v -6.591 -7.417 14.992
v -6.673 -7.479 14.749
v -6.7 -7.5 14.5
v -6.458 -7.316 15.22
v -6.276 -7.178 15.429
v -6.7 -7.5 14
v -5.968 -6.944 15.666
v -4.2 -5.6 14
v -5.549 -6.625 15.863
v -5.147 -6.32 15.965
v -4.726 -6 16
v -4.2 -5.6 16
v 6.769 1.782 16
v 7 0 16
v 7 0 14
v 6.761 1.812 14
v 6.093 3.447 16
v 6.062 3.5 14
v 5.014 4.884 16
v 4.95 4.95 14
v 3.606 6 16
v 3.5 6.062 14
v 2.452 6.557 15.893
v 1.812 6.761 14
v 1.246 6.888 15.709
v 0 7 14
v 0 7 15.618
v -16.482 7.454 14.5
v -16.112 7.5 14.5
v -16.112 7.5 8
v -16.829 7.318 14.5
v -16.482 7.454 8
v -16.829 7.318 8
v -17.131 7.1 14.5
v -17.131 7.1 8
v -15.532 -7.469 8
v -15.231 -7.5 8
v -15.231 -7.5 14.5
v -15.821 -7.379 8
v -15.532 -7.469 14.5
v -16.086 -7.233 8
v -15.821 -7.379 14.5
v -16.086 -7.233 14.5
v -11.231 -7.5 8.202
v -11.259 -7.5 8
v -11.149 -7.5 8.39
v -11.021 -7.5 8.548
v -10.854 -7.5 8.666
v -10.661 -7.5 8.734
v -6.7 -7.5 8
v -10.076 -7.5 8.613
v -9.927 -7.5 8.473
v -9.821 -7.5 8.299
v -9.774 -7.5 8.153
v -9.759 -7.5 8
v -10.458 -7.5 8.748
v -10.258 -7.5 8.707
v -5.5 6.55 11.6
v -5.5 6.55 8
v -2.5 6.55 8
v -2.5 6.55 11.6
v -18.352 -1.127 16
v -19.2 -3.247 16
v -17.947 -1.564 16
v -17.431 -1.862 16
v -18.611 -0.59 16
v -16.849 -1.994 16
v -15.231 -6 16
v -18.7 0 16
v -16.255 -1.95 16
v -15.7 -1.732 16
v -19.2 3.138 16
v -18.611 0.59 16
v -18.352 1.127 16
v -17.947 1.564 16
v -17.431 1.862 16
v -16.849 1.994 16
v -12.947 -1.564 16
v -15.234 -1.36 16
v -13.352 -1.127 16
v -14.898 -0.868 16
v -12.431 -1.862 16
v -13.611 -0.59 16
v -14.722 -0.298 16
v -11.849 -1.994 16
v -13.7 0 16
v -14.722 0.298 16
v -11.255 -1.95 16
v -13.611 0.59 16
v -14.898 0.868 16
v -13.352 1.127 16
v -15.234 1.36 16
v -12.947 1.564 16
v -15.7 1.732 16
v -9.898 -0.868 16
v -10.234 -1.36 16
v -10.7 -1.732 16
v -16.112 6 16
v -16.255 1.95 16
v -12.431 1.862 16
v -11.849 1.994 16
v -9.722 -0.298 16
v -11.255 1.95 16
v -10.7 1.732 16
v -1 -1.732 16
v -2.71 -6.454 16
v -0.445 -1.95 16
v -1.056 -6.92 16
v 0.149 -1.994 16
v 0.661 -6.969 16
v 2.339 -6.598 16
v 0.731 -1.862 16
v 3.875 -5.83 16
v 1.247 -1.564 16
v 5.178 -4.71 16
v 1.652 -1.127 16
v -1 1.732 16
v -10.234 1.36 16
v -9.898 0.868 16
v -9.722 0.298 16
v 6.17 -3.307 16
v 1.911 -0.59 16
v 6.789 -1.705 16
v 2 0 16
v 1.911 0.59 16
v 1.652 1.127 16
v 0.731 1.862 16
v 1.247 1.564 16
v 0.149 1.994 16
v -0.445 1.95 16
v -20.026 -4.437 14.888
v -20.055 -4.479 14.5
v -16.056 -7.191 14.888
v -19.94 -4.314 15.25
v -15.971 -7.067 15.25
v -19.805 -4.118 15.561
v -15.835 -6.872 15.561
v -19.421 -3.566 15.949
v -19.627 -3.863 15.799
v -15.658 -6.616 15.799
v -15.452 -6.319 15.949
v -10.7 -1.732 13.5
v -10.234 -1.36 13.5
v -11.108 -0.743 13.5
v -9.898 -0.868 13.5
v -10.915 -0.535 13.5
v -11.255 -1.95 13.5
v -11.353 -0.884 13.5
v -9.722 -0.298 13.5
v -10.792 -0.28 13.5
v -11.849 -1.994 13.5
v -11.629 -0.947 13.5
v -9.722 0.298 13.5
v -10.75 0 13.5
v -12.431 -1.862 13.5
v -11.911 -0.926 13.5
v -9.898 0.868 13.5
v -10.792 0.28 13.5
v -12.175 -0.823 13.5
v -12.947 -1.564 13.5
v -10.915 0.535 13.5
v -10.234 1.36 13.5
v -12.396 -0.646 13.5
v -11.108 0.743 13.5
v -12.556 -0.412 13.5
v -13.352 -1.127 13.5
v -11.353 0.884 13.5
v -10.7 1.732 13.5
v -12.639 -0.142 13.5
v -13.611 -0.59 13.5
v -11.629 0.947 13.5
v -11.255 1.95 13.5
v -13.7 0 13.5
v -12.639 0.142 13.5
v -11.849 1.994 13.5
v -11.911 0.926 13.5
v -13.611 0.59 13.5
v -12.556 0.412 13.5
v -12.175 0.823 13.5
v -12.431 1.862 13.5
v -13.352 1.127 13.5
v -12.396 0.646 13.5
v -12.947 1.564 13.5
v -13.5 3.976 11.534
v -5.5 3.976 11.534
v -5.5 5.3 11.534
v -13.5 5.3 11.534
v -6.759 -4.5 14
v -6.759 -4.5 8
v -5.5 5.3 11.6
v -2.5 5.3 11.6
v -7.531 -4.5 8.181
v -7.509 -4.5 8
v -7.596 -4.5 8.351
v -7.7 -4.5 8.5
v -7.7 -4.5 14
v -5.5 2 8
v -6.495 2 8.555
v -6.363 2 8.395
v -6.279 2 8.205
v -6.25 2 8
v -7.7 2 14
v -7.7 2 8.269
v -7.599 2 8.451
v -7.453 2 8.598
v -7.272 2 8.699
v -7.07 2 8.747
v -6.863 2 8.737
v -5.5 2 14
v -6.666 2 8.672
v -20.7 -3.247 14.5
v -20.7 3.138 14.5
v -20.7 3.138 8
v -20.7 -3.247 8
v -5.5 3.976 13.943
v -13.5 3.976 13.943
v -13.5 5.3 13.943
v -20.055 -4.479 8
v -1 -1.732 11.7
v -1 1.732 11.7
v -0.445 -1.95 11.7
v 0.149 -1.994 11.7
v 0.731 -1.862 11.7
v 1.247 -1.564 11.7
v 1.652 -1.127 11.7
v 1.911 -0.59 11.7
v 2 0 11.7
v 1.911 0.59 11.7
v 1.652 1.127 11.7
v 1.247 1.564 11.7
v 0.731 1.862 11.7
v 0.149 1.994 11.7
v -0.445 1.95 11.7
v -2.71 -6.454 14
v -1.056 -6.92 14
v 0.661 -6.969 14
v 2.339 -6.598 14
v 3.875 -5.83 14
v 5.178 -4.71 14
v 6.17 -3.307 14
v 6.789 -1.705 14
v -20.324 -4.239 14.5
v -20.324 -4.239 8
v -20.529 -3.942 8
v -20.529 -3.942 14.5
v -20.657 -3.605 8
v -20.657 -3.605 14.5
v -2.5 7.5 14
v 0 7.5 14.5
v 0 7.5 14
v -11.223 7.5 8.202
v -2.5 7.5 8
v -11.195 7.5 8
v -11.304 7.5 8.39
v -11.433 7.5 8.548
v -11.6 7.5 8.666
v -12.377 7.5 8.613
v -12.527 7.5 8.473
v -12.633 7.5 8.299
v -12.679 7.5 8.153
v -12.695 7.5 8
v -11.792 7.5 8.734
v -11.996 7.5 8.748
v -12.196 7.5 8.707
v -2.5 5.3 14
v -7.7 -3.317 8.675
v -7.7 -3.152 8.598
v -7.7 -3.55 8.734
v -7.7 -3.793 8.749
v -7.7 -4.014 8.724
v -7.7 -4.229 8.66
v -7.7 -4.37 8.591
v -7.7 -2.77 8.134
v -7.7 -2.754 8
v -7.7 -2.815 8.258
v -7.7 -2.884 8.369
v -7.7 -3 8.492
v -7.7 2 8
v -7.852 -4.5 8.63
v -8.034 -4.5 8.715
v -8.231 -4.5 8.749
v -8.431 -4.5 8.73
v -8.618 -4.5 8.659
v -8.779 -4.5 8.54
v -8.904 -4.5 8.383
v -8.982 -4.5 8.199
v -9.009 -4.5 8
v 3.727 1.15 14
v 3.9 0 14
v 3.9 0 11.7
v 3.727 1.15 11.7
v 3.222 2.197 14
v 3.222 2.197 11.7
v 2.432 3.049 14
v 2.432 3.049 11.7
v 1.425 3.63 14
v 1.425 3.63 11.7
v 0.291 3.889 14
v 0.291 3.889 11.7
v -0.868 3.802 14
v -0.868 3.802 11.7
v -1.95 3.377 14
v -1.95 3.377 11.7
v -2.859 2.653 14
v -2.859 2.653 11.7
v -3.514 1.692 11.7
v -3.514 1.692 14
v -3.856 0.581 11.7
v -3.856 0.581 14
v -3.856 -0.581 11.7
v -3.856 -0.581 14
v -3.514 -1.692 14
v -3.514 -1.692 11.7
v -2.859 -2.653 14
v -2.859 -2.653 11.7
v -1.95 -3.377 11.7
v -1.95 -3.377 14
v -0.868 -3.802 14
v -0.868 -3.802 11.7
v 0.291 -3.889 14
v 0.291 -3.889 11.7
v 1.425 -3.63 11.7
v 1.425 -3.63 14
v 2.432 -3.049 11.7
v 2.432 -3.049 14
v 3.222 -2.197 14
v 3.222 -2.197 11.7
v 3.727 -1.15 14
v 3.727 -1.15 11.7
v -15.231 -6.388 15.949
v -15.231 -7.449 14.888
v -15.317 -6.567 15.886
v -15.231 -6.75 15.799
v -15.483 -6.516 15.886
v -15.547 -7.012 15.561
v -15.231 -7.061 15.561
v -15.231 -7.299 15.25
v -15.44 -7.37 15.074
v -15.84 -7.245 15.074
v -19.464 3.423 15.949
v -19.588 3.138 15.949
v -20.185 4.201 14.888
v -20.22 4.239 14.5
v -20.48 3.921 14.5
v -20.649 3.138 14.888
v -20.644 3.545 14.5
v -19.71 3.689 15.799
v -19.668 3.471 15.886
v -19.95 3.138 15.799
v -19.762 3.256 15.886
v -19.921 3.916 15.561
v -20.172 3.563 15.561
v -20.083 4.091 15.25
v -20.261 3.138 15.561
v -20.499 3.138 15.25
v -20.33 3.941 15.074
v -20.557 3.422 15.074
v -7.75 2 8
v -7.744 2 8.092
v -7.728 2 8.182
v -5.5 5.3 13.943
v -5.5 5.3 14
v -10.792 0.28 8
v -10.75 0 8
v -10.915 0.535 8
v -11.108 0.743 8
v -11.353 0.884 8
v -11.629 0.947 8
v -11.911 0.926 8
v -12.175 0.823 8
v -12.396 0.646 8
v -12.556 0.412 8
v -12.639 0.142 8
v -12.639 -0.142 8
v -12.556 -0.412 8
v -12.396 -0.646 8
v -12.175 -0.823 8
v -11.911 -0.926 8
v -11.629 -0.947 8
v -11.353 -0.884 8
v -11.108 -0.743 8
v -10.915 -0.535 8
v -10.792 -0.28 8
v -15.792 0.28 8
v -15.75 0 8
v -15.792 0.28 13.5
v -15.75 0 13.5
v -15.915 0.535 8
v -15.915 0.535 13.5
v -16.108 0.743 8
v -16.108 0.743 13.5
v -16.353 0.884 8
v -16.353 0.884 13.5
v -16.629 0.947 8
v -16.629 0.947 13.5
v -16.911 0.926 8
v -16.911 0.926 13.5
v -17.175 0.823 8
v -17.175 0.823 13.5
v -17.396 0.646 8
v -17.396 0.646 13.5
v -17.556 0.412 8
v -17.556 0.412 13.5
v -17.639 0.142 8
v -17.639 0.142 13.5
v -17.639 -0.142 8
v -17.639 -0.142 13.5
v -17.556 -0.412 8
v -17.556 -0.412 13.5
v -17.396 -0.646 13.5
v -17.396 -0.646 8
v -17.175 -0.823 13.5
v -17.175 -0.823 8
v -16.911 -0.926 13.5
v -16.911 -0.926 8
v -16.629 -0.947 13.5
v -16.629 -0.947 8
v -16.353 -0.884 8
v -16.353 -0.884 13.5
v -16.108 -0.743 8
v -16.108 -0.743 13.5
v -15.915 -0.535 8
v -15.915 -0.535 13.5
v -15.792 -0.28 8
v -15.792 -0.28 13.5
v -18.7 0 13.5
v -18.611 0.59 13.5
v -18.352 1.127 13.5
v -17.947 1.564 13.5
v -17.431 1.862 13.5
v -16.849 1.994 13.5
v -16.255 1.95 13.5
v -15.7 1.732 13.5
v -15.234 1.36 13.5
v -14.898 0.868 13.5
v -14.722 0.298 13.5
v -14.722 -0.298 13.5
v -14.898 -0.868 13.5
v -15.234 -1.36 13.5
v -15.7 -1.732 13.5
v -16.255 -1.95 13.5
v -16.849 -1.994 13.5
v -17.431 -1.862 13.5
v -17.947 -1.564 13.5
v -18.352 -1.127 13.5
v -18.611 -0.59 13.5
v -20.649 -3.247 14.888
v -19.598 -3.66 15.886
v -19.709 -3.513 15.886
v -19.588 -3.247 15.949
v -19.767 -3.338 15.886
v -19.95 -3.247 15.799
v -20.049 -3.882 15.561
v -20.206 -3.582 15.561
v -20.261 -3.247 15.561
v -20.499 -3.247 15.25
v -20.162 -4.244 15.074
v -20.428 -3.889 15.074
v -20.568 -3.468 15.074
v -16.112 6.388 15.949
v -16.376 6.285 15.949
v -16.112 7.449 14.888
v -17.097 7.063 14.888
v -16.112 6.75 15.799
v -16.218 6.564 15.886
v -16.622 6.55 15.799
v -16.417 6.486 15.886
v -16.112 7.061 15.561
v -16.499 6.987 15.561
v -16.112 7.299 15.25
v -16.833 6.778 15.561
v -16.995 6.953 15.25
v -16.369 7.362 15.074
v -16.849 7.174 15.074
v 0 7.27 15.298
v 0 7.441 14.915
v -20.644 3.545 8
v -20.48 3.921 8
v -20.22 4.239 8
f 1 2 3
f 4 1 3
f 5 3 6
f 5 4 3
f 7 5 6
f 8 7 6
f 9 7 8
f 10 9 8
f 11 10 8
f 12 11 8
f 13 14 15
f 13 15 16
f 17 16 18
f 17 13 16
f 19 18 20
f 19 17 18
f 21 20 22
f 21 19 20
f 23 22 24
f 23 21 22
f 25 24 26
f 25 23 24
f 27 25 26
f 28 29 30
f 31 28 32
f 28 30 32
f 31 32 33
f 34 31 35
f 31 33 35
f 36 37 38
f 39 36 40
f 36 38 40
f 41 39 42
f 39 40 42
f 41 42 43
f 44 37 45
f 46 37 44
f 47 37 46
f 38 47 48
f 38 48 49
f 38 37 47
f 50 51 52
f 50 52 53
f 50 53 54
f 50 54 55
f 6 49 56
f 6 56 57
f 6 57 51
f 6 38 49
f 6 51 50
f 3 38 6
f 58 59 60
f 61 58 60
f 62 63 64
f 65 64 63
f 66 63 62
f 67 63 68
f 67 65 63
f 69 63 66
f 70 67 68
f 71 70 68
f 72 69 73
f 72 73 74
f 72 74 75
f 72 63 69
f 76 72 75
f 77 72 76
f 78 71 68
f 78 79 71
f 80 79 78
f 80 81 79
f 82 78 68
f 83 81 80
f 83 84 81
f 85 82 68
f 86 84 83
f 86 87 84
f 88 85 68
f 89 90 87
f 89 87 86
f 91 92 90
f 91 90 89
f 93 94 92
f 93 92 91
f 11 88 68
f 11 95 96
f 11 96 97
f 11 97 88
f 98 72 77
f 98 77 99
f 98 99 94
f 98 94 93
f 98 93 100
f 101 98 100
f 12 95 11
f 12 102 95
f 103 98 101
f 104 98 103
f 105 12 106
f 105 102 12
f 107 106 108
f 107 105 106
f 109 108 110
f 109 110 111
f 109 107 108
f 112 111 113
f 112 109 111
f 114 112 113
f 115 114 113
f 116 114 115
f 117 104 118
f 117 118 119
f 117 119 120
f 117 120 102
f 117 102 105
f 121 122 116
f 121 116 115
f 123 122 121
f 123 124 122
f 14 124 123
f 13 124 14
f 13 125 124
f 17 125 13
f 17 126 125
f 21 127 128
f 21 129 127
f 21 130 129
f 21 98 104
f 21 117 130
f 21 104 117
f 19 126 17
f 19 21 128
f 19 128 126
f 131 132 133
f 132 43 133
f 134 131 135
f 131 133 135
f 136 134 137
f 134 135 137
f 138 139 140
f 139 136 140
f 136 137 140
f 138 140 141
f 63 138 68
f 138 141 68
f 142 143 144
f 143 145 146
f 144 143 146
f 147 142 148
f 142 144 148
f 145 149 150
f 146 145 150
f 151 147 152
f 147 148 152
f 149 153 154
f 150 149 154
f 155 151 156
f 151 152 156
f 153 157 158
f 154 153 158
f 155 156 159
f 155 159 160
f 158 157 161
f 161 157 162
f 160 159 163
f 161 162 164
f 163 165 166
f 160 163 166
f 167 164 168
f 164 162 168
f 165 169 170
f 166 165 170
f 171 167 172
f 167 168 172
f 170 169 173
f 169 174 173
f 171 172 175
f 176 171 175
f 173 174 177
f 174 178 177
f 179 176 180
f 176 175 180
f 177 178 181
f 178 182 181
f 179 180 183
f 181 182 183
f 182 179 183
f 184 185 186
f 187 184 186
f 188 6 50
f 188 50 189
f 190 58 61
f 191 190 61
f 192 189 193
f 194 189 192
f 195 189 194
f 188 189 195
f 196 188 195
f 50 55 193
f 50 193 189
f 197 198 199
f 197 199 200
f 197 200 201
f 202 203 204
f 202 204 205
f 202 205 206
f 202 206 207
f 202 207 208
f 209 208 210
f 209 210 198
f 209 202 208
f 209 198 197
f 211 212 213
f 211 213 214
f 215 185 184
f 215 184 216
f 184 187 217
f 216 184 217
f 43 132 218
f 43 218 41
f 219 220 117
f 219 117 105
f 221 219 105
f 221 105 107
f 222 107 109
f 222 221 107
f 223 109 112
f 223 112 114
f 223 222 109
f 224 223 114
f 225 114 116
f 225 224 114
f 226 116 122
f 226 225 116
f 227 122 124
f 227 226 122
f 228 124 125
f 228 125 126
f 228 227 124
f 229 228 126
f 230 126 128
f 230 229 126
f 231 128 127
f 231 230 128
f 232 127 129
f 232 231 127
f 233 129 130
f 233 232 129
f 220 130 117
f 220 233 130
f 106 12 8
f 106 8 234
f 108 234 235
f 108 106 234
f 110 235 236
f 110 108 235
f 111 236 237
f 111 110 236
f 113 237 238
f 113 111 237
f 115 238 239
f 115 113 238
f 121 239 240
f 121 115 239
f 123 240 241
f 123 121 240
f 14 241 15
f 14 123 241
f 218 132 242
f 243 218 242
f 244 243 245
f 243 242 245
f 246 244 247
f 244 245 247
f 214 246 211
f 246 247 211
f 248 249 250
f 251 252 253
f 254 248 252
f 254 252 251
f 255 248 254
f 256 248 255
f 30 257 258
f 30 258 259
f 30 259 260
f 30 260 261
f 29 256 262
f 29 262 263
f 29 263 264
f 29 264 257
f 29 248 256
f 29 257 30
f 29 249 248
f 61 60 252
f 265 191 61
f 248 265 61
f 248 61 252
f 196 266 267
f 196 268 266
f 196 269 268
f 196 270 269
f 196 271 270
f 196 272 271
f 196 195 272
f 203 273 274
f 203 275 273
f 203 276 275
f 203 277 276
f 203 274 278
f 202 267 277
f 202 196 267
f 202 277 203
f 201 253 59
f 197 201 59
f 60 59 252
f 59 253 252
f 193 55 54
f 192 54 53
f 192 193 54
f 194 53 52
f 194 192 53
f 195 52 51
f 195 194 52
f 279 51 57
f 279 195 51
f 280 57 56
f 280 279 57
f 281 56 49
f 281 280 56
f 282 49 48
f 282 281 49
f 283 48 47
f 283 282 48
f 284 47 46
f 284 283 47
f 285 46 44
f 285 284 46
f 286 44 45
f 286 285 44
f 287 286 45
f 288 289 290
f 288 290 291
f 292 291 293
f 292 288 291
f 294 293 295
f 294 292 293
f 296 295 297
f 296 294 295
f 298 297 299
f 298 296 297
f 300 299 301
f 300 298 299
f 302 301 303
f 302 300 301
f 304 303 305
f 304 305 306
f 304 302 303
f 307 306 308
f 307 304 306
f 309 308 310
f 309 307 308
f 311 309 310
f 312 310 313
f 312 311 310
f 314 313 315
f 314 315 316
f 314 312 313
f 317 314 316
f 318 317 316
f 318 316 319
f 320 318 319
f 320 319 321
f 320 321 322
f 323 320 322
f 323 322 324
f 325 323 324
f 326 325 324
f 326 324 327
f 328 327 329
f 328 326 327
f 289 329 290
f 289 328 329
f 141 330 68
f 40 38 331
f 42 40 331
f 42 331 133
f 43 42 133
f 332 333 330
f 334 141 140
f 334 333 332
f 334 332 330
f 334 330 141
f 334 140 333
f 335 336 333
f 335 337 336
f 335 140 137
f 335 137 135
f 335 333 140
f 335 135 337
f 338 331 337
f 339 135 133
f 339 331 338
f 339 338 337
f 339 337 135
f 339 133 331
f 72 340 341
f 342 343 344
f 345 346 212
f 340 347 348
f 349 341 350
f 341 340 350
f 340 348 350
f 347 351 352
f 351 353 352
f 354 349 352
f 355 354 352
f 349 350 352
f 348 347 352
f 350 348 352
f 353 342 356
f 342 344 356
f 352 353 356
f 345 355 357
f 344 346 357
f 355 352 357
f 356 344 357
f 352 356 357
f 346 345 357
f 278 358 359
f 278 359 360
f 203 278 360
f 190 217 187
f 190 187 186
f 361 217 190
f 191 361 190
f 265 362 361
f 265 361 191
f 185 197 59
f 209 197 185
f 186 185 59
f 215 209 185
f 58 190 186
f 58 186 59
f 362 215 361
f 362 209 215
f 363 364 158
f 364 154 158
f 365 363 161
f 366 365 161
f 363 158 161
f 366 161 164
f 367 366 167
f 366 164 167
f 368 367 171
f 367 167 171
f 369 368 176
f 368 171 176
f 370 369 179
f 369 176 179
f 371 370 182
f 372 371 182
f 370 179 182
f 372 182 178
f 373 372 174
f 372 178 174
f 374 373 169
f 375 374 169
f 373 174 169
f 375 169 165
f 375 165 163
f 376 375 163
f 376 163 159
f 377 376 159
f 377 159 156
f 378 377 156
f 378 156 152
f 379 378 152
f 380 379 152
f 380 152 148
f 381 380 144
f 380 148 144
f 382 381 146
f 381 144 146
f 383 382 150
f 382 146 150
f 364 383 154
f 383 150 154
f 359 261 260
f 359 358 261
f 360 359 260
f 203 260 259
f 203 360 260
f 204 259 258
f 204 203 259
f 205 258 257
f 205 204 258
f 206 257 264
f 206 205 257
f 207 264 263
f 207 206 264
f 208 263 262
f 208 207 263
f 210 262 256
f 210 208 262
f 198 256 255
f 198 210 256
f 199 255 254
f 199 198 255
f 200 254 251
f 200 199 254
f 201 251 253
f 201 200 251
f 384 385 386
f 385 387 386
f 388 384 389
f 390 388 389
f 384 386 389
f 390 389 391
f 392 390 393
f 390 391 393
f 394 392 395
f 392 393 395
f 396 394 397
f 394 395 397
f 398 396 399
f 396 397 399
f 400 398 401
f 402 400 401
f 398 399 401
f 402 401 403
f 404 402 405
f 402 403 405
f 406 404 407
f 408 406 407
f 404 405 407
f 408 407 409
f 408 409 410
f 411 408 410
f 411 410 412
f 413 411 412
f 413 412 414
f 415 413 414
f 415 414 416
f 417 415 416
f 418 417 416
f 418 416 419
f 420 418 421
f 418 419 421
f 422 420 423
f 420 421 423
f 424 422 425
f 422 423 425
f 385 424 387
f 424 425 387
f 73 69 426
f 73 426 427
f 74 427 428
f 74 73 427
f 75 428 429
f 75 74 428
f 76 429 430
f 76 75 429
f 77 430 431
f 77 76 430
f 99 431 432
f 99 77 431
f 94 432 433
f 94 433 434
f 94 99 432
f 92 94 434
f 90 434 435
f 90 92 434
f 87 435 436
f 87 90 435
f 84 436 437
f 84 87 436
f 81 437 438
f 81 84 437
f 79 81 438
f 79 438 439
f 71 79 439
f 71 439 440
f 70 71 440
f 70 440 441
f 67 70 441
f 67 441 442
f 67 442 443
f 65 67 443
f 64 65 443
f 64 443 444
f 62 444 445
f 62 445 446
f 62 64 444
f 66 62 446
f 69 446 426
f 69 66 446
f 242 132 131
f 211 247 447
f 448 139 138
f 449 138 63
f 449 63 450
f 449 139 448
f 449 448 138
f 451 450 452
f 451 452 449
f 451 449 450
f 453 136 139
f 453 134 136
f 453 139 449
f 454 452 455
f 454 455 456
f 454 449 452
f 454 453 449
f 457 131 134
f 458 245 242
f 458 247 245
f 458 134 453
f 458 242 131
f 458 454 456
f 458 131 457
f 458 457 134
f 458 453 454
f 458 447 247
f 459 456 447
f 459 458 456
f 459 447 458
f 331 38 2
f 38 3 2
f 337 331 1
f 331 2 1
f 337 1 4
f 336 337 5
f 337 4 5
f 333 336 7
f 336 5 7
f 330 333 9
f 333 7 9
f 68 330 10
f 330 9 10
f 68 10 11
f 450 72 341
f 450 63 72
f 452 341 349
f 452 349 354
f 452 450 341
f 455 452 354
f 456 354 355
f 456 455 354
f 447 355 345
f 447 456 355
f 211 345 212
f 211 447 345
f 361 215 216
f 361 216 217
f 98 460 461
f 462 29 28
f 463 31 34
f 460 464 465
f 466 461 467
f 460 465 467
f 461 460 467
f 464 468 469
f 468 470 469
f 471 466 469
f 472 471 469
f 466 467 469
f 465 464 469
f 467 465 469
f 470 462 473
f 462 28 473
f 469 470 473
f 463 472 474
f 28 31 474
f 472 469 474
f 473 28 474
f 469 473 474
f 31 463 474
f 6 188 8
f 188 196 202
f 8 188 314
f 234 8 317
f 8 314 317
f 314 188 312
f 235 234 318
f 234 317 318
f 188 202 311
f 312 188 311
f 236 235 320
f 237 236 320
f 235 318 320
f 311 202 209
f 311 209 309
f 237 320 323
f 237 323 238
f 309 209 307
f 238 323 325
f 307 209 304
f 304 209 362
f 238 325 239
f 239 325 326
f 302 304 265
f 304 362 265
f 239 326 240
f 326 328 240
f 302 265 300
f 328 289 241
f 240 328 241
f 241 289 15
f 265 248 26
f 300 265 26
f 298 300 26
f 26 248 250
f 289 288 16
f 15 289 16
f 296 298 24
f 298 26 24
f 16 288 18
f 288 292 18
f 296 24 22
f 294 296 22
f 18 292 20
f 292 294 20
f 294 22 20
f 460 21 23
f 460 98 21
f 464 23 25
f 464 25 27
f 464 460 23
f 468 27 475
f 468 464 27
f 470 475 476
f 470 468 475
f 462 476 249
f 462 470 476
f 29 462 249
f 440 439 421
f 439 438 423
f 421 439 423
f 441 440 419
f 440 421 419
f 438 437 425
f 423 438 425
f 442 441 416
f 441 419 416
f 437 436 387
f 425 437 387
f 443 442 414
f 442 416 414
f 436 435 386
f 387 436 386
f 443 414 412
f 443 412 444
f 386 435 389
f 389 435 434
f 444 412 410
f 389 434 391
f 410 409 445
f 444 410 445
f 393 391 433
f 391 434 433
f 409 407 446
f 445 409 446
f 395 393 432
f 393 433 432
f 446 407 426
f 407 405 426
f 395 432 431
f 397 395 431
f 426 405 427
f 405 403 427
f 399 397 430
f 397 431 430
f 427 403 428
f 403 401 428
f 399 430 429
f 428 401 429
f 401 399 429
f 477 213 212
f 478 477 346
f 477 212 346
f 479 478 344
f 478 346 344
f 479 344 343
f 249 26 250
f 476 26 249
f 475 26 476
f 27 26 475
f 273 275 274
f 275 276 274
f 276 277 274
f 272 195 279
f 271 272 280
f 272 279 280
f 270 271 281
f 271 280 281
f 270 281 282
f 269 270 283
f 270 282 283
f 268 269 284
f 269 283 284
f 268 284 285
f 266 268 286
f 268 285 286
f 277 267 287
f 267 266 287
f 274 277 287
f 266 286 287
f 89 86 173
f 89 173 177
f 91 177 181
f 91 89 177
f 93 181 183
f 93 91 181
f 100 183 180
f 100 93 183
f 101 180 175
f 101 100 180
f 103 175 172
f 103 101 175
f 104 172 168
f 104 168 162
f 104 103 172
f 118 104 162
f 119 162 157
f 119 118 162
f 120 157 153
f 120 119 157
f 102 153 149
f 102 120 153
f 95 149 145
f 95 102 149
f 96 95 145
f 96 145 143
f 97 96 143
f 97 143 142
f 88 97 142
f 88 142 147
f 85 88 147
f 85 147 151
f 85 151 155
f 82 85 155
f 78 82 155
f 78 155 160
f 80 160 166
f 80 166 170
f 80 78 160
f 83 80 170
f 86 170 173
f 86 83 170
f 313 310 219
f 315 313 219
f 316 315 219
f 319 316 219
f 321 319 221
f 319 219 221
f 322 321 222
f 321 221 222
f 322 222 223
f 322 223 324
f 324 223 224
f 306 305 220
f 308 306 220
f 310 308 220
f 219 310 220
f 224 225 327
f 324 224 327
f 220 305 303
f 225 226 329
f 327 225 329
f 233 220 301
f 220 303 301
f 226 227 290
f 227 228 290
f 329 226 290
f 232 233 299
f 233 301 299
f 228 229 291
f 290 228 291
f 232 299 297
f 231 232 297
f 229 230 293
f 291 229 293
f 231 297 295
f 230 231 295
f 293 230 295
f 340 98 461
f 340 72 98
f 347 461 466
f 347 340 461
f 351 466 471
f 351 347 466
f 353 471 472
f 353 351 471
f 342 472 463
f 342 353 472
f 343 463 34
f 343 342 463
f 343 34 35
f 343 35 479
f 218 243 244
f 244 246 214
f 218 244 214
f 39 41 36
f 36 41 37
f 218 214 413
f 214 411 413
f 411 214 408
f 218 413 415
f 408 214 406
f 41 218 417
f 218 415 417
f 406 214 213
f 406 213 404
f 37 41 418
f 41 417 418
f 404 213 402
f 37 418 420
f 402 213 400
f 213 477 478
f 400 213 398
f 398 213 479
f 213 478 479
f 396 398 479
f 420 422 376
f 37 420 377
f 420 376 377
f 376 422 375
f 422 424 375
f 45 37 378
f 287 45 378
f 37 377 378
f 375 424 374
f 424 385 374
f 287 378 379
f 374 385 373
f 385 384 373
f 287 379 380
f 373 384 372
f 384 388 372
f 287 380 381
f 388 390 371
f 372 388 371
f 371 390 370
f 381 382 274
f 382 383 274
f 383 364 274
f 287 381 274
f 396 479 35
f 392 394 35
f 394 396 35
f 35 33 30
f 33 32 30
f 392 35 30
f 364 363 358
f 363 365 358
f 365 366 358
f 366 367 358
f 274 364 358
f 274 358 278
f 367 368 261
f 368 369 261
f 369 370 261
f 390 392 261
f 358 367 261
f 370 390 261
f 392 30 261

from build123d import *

# Parameters (mm, degrees)
BOSS_EXTRUDE1_DEPTH = 2
BOSS_EXTRUDE2_DEPTH = 6
SKETCH24_R          = 3.9
BOSS_EXTRUDE5_DEPTH = 2.3
SKETCH30_W          = 2.408612022
SKETCH30_H          = 1.324178481
CUT_EXTRUDE12_DEPTH = 8
CUT_EXTRUDE11_DEPTH = 5.3
FILLET1_R           = 1.5
SKETCH34_R          = 0.75
CUT_EXTRUDE13_DEPTH = 8
SKETCH35_R          = 0.75
CUT_EXTRUDE14_DEPTH = 4
SKETCH36_R          = 0.95
CUT_EXTRUDE15_DEPTH = 8
SKETCH37_R          = 2
CUT_EXTRUDE16_DEPTH = 2.5
SKETCH38_W          = 3
SKETCH38_H          = 1.25
CUT_EXTRUDE17_DEPTH = 3.6


with BuildPart() as part:
    # Sketch2 → Boss-Extrude1 (new body)
    with BuildSketch(Plane.XY):
        with BuildLine():
            Line((-2.5, 7.5), (-16.7, 7.5))
            Line((-16.7, 7.5), (-20.7, 3.793442666))
            Line((-20.7, 3.793442666), (-20.7, -4.031648778))
            Line((-20.7, -4.031648778), (-15.7, -7.5))
            Line((-15.7, -7.5), (-6.7, -7.5))
            Line((-6.7, -7.5), (-4.2, -5.6))
            ThreePointArc((-4.2, -5.6), (3.130495168, -6.260990337), (7, 0))
            ThreePointArc((7, 0), (4.949747468, 4.949747468), (0, 7))
            Line((0, 7), (0, 7.5))
            Line((0, 7.5), (-2.5, 7.5))
        make_face()
    extrude(amount=BOSS_EXTRUDE1_DEPTH)

    # Sketch4 → Boss-Extrude2 (add)
    with BuildSketch(Plane.XY.offset(2)):
        Polygon((-15.7, -7.5), (-6.7, -7.5), (-6.759079174, -4.5), (-7.7, -4.5), (-7.7, 2), (-5.5, 2), (-5.5, 5.3), (-2.5, 5.3), (-2.5, 7.5), (-16.7, 7.5), (-20.7, 3.793442666), (-20.7, -4.031648778), align=None)
    extrude(amount=BOSS_EXTRUDE2_DEPTH)

    # Sketch24 → Boss-Extrude5 (add)
    with BuildSketch(Plane.XY.offset(2)):
        Circle(SKETCH24_R)
    extrude(amount=BOSS_EXTRUDE5_DEPTH)

    # Sketch30 → Cut-Extrude12 (cut)
    with BuildSketch(Plane(origin=(-5.5, 0, 0), x_dir=(0, 0, -1), z_dir=(1, 0, 0))):
        with Locations((-3.261593395, 4.63791076)):
            Rectangle(SKETCH30_W, SKETCH30_H)
    extrude(amount=-CUT_EXTRUDE12_DEPTH, mode=Mode.SUBTRACT)

    # Sketch28 → Cut-Extrude11 (cut, through all)
    with BuildSketch(Plane.XY.offset(4.3)):
        with BuildLine():
            Line((-1, 1.732050808), (-1, -1.732050808))
            ThreePointArc((-1, -1.732050808), (2, 0), (-1, 1.732050808))
        make_face()
    extrude(amount=-CUT_EXTRUDE11_DEPTH, mode=Mode.SUBTRACT)

    # Fillet1
    fillet1_edges = [part.edges().sort_by_distance(p)[0] for p in [
        (-11.2, -7.5, 0),
        (-8.35, 7.5, 0),
        (-18.7, 5.646721333, 0),
        (-18.2, -5.765824389, 0),
        (-20.7, -0.119103056, 0),
        (-15.7, -7.5, 4),
        (-20.7, -4.031648778, 4),
        (-20.7, 3.793442666, 4),
        (-16.7, 7.5, 4),
    ]]
    fillet(fillet1_edges, radius=FILLET1_R)

    # Sketch34 → Cut-Extrude13 (cut, along a direction that is not the sketch's normal)
    with BuildSketch(Plane.XZ.offset(-2)):
        with Locations((-7, 8)):
            Circle(SKETCH34_R)
    extrude(amount=-CUT_EXTRUDE13_DEPTH, dir=(0.668583388, -0.743637179, 0), mode=Mode.SUBTRACT)

    # Sketch35 → Cut-Extrude14 (cut, symmetric, along a direction that is not the sketch's normal)
    with BuildSketch(Plane(origin=(0, -4.5, 0), x_dir=(1, 0, 0), z_dir=(0, 1, 0))):
        with Locations((-8.259079174, -8)):
            Circle(SKETCH35_R)
    extrude(amount=CUT_EXTRUDE14_DEPTH, dir=(0.599919418, 0.80006043, 0), both=True, mode=Mode.SUBTRACT)

    # Sketch36 → Cut-Extrude15 (cut)
    with BuildSketch(Plane.XY.offset(8)):
        with Locations((-11.7, 0)):
            Circle(SKETCH36_R)
        with Locations((-16.7, 0)):
            Circle(SKETCH36_R)
    extrude(amount=-CUT_EXTRUDE15_DEPTH, mode=Mode.SUBTRACT)

    # Sketch37 → Cut-Extrude16 (cut)
    with BuildSketch(Plane(origin=(0, 0, 0), x_dir=(-1, 0, 0), z_dir=(0, 0, -1))):
        with Locations((11.7, 0)):
            Circle(SKETCH37_R)
        with Locations((16.7, 0)):
            Circle(SKETCH37_R)
    extrude(amount=-CUT_EXTRUDE16_DEPTH, mode=Mode.SUBTRACT)

    # Sketch38 → Cut-Extrude17 (cut)
    with BuildSketch(Plane.XY.offset(8)):
        with Locations((-4, 5.925)):
            Rectangle(SKETCH38_W, SKETCH38_H)
    extrude(amount=-CUT_EXTRUDE17_DEPTH, mode=Mode.SUBTRACT)

    # Mirror1: part across plane


with BuildPart() as part_1:
    add(part.part)
    add(part.part.mirror(Plane.XY.offset(8)))


with BuildPart() as body_2:
    # Split1: the piece on the far side of the plane
    add(part_1.part)
    split(bisect_by=Plane.XY.offset(8), keep=Keep.BOTTOM)


with BuildPart() as part_2:
    add(part_1.part)

    # Split1
    split(bisect_by=Plane.XY.offset(8), keep=Keep.TOP)


solid = part_2.part
